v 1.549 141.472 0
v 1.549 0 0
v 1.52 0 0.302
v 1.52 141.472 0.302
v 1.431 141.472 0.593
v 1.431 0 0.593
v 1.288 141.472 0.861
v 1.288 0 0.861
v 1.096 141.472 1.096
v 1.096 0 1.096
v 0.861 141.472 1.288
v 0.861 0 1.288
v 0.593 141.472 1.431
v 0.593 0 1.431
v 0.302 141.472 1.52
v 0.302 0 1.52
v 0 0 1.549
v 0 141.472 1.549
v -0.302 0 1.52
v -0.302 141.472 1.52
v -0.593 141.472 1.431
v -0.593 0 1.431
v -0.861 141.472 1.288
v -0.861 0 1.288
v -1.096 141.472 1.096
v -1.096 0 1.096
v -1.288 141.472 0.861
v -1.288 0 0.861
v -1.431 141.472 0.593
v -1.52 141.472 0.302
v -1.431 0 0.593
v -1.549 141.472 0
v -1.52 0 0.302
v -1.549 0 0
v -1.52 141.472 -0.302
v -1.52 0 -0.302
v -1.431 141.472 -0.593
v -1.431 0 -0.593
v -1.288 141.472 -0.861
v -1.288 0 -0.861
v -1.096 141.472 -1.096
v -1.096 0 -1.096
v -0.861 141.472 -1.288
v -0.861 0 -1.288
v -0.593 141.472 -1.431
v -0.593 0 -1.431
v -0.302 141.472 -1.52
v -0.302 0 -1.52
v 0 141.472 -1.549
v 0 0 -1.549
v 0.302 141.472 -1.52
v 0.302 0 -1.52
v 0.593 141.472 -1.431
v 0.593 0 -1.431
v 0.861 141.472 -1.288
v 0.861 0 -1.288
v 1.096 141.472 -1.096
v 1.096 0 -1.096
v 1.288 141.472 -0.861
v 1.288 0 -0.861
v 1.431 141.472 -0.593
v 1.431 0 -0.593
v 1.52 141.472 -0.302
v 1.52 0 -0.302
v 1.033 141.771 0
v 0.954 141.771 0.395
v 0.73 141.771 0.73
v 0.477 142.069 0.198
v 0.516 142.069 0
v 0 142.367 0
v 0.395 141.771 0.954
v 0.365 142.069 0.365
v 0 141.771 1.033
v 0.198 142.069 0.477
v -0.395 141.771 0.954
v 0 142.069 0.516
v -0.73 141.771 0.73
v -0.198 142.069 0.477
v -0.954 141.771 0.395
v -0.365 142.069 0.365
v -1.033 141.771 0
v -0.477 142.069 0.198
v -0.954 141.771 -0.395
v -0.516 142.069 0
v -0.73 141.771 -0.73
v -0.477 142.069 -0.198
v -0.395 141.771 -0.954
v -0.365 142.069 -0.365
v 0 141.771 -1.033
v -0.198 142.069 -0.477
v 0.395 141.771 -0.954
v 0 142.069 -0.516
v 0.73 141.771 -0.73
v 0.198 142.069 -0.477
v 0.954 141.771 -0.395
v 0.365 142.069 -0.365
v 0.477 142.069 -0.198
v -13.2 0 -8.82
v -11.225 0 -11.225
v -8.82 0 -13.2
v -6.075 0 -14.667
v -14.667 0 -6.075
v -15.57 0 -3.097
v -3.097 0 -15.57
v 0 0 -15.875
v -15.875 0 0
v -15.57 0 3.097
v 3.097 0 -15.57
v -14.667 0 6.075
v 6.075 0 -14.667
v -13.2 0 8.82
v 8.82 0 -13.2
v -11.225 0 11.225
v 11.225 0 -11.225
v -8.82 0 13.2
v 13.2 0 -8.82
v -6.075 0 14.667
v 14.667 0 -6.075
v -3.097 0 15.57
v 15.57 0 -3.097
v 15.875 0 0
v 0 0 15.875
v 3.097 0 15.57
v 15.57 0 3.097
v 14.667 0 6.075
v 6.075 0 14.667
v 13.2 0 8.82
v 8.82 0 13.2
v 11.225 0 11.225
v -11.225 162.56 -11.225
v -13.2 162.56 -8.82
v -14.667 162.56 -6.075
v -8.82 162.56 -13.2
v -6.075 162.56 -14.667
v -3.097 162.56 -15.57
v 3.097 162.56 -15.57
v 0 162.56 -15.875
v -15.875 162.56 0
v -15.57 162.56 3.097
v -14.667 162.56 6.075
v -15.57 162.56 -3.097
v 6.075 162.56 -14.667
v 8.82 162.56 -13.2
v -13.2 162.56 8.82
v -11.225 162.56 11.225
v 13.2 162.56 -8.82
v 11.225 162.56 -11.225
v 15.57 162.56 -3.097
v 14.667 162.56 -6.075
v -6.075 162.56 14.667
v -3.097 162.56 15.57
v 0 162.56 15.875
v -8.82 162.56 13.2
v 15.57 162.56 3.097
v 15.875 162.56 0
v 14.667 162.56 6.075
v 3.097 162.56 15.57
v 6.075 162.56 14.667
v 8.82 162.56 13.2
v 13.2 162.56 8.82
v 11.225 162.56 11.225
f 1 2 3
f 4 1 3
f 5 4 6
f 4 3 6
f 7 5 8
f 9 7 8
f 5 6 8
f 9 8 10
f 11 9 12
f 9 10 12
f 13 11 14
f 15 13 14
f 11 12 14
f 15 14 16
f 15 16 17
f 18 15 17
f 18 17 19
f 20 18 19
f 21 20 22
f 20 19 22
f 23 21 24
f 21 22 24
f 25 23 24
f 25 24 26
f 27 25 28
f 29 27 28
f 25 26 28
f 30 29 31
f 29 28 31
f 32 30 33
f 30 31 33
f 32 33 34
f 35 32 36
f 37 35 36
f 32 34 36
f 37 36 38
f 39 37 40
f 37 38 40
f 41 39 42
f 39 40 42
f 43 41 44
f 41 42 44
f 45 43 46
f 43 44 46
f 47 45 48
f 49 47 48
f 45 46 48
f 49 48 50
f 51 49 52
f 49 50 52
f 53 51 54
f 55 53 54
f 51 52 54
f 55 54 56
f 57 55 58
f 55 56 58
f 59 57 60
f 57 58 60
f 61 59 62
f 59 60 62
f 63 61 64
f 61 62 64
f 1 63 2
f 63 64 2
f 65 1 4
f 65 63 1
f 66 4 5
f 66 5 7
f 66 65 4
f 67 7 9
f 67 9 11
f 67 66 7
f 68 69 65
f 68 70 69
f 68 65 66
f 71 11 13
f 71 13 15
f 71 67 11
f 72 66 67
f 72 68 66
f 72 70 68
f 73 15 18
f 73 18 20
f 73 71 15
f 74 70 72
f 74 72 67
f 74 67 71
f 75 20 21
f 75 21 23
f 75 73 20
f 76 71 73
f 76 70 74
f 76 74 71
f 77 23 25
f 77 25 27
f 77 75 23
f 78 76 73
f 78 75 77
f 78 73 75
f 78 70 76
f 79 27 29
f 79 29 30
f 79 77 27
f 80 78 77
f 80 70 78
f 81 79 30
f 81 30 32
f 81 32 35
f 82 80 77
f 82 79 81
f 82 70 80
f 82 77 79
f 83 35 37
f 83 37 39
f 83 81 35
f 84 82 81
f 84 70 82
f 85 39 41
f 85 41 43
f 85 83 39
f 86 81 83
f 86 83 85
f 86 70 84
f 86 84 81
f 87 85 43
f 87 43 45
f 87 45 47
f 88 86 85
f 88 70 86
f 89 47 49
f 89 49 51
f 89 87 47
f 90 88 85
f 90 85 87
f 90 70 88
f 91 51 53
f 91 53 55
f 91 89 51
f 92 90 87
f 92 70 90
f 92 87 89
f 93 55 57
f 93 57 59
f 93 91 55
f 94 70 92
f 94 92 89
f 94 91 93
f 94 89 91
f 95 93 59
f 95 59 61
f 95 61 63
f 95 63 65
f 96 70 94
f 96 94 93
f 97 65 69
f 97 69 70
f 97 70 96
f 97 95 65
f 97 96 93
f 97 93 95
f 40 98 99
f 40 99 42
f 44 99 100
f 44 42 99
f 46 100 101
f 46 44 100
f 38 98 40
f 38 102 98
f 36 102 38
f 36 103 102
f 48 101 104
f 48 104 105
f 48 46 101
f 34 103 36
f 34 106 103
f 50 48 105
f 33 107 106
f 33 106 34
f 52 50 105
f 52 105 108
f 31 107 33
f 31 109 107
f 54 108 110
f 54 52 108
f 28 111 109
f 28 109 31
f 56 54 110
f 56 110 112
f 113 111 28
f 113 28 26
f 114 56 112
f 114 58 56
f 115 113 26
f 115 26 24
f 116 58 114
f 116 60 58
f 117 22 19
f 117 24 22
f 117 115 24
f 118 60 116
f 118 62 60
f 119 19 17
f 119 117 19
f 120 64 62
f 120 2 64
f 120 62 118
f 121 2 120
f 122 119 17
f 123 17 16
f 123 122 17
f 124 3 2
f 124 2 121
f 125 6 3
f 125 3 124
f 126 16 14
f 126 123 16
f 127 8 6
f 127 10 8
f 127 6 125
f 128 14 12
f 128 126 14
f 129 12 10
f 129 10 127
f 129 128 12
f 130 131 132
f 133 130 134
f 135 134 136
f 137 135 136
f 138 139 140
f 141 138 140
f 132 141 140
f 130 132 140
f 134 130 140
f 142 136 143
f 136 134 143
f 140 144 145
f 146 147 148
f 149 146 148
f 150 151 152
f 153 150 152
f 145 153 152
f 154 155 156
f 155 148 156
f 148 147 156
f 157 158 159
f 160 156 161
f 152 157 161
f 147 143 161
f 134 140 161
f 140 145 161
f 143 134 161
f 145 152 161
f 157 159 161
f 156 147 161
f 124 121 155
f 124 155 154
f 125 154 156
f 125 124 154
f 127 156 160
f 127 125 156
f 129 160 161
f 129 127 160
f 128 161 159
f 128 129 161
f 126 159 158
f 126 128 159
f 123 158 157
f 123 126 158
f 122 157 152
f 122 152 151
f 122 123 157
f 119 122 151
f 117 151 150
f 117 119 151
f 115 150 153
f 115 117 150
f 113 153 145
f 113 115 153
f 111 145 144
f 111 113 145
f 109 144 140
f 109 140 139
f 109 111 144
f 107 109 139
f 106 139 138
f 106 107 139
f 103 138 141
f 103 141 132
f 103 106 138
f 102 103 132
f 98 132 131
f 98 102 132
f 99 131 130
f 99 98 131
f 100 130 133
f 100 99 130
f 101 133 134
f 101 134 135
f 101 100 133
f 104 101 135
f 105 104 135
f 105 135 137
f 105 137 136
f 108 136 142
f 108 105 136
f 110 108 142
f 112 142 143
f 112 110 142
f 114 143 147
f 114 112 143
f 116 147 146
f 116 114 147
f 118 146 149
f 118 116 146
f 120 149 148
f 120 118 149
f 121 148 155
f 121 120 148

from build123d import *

# Parameters (mm, degrees)
F0_R     = 15.875
F1_DEPTH = 162.56
F2_R     = 1.5494
F3_DEPTH = 142.367
F4_SIZE2 = 1.5494
F4_SIZE  = 0.8945465071


with BuildPart() as f1:
    # F0 (on Front) → F1 (new body)
    with BuildSketch(Plane.XZ):
        Circle(F0_R)
    extrude(amount=-F1_DEPTH)

    # F2 (on Front) → F3 (cut)
    with BuildSketch(Plane.XZ):
        Circle(F2_R)
    extrude(amount=-F3_DEPTH, mode=Mode.SUBTRACT)

    # F4
    f4_edges = [f1.edges().sort_by_distance(p)[0] for p in [
        (-1.5494, 142.367, 0),
    ]]
    f4_side = f1.faces().sort_by_distance((-1.5494, 71.1835, 0))[0]
    chamfer(f4_edges, length=F4_SIZE, length2=F4_SIZE2, reference=f4_side)


solid = f1.part
